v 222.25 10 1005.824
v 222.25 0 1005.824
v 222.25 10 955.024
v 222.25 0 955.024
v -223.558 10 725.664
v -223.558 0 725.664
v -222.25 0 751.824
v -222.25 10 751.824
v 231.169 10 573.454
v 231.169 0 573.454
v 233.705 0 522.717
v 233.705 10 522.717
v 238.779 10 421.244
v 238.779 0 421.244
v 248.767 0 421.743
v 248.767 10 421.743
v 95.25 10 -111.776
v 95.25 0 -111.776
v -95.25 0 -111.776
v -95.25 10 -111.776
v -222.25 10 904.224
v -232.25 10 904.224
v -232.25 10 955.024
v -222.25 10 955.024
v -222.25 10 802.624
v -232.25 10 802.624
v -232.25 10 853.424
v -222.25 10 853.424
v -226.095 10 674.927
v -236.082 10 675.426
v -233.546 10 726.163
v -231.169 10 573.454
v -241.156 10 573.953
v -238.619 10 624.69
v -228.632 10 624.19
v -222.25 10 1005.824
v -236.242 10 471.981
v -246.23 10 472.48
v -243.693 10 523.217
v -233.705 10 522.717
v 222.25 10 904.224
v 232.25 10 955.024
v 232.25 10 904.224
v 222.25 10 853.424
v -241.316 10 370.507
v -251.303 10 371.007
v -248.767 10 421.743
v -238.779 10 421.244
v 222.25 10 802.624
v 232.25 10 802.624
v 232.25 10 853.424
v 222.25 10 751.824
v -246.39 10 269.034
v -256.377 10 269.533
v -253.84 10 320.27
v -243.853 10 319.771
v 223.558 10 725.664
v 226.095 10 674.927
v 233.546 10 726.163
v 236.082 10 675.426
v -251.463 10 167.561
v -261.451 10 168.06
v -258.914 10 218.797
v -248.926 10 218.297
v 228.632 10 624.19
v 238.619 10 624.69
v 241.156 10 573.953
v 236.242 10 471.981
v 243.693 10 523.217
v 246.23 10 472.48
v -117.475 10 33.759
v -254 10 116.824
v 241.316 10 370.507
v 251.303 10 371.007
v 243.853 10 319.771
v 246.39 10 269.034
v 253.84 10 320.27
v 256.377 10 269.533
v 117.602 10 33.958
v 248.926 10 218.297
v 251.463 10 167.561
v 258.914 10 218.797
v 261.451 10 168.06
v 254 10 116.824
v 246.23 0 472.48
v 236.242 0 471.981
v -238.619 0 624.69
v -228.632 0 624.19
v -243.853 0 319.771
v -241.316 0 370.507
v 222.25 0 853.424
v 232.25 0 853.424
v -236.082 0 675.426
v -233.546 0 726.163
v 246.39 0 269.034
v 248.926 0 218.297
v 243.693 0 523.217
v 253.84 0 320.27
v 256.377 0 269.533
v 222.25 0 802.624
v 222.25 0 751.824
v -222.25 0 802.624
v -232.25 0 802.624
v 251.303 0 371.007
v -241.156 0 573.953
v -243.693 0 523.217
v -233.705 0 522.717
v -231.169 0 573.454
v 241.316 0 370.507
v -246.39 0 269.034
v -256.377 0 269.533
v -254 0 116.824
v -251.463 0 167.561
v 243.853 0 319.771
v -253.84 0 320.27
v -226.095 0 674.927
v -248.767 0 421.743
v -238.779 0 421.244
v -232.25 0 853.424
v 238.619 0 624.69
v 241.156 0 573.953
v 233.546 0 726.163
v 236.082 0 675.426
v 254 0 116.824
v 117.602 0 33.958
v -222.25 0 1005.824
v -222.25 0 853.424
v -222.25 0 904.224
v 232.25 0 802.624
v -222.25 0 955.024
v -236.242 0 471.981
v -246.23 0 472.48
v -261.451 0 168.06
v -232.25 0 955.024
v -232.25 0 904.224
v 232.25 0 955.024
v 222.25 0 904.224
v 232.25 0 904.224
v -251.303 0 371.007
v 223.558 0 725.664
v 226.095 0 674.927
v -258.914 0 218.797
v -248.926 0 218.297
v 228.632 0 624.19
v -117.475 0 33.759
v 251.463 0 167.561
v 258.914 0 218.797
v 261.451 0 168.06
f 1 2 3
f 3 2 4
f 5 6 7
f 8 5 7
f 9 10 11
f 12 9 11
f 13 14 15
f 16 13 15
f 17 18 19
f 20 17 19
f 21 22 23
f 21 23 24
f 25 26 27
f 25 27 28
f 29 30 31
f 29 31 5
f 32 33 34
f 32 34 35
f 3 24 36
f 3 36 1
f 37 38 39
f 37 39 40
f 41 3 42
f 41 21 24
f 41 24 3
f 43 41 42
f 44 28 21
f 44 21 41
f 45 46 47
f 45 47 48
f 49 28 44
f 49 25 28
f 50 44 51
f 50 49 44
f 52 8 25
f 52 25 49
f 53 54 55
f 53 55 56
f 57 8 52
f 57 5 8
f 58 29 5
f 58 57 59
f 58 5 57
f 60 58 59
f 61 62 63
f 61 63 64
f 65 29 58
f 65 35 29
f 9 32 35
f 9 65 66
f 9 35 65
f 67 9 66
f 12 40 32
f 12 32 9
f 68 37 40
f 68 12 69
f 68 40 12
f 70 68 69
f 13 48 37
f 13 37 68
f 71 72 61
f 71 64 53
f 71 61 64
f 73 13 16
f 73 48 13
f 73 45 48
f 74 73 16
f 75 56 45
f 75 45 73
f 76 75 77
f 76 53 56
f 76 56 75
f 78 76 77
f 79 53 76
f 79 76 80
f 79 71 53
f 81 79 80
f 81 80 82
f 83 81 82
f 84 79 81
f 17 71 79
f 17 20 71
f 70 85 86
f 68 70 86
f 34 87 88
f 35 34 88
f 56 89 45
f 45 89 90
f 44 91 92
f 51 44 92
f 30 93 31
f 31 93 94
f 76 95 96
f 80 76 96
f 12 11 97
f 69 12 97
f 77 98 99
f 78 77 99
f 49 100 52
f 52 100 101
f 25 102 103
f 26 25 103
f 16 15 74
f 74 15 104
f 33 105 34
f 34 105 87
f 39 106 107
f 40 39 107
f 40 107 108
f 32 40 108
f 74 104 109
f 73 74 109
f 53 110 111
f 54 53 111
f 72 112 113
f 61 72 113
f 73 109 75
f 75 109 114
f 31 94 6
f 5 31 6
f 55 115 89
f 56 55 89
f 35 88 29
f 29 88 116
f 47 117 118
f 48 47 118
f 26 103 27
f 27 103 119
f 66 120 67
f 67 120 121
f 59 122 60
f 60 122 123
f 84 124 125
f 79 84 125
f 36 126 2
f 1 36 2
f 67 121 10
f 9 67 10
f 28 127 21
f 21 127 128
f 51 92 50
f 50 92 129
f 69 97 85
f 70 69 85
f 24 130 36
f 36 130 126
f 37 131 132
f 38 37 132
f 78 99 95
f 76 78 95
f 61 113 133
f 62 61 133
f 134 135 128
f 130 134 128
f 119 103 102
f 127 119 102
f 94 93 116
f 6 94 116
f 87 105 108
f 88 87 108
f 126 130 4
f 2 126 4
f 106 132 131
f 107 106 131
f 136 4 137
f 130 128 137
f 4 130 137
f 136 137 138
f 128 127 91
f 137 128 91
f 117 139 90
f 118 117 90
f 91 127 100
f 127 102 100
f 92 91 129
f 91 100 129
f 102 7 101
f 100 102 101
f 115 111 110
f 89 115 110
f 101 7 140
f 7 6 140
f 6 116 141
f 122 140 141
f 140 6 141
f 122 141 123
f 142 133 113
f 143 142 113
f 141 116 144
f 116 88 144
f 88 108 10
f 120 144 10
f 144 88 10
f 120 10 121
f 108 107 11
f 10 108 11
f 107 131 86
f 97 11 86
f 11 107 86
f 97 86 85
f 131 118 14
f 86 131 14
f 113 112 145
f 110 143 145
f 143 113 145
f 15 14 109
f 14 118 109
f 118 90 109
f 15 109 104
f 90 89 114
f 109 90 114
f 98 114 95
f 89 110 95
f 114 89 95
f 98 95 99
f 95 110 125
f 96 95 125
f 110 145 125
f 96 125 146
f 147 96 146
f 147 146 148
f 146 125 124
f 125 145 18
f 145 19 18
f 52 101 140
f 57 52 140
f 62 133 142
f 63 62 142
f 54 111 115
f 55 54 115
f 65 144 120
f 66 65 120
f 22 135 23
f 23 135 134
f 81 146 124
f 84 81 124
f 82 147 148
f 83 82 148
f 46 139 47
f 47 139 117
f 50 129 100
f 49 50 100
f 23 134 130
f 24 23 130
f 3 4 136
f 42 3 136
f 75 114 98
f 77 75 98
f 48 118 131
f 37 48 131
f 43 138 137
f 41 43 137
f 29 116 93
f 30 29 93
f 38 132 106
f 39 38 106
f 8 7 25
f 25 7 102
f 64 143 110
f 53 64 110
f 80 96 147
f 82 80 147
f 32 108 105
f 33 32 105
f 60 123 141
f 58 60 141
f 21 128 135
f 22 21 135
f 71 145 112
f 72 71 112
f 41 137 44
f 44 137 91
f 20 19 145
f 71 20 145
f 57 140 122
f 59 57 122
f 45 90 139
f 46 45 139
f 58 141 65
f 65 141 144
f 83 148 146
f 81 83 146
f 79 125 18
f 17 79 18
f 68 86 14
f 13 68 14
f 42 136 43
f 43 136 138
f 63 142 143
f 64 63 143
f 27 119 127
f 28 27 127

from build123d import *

# Parameters (mm, degrees)
BOSS_EXTRUDE1_DEPTH = 10


with BuildPart() as part:
    # Sketch1 → Boss-Extrude1 (new body)
    with BuildSketch(Plane(origin=(0, 0, 0), x_dir=(1, 0, 0), z_dir=(0, 1, 0))):
        Polygon((-222.25, -751.824242644), (-222.25, -802.624242644), (-232.25, -802.624242644), (-232.25, -853.424242644), (-222.25, -853.424242644), (-222.25, -904.224242644), (-232.25, -904.224242644), (-232.25, -955.024242644), (-222.25, -955.024242644), (-222.25, -1005.824242644), (222.25, -1005.824242644), (222.25, -955.024242644), (232.25, -955.024242644), (232.25, -904.224242644), (222.25, -904.224242644), (222.25, -853.424242644), (232.25, -853.424242644), (232.25, -802.624242644), (222.25, -802.624242644), (222.25, -751.824242644), (223.558028711, -725.663668424), (233.5455521, -726.163044593), (236.082383041, -675.426425778), (226.094859652, -674.927049609), (228.631690593, -624.190430794), (238.619213981, -624.689806963), (241.156044922, -573.953188148), (231.168521533, -573.453811979), (233.705352474, -522.717193164), (243.692875863, -523.216569333), (246.229706804, -472.479950518), (236.242183415, -471.980574349), (238.779014356, -421.243955534), (248.766537744, -421.743331703), (251.303368685, -371.006712888), (241.315845296, -370.507336719), (243.852676237, -319.770717904), (253.840199626, -320.270094073), (256.377030567, -269.533475258), (246.389507178, -269.034099089), (248.926338119, -218.297480274), (258.913861507, -218.796856443), (261.450692448, -168.060237628), (251.463169059, -167.560861459), (254, -116.824242644), (117.602, -33.957645835), (95.25, 111.775757356), (-95.25, 111.775757356), (-117.475, -33.759249998), (-254, -116.824242644), (-251.463169059, -167.560861459), (-261.450692448, -168.060237628), (-258.913861507, -218.796856443), (-248.926338119, -218.297480274), (-246.389507178, -269.034099089), (-256.377030567, -269.533475258), (-253.840199626, -320.270094073), (-243.852676237, -319.770717904), (-241.315845296, -370.507336719), (-251.303368685, -371.006712888), (-248.766537744, -421.743331703), (-238.779014356, -421.243955534), (-236.242183415, -471.980574349), (-246.229706804, -472.479950518), (-243.692875863, -523.216569333), (-233.705352474, -522.717193164), (-231.168521533, -573.453811979), (-241.156044922, -573.953188148), (-238.619213981, -624.689806963), (-228.631690593, -624.190430794), (-226.094859652, -674.927049609), (-236.082383041, -675.426425778), (-233.5455521, -726.163044593), (-223.558028711, -725.663668424), align=None)
    extrude(amount=BOSS_EXTRUDE1_DEPTH)


solid = part.part
